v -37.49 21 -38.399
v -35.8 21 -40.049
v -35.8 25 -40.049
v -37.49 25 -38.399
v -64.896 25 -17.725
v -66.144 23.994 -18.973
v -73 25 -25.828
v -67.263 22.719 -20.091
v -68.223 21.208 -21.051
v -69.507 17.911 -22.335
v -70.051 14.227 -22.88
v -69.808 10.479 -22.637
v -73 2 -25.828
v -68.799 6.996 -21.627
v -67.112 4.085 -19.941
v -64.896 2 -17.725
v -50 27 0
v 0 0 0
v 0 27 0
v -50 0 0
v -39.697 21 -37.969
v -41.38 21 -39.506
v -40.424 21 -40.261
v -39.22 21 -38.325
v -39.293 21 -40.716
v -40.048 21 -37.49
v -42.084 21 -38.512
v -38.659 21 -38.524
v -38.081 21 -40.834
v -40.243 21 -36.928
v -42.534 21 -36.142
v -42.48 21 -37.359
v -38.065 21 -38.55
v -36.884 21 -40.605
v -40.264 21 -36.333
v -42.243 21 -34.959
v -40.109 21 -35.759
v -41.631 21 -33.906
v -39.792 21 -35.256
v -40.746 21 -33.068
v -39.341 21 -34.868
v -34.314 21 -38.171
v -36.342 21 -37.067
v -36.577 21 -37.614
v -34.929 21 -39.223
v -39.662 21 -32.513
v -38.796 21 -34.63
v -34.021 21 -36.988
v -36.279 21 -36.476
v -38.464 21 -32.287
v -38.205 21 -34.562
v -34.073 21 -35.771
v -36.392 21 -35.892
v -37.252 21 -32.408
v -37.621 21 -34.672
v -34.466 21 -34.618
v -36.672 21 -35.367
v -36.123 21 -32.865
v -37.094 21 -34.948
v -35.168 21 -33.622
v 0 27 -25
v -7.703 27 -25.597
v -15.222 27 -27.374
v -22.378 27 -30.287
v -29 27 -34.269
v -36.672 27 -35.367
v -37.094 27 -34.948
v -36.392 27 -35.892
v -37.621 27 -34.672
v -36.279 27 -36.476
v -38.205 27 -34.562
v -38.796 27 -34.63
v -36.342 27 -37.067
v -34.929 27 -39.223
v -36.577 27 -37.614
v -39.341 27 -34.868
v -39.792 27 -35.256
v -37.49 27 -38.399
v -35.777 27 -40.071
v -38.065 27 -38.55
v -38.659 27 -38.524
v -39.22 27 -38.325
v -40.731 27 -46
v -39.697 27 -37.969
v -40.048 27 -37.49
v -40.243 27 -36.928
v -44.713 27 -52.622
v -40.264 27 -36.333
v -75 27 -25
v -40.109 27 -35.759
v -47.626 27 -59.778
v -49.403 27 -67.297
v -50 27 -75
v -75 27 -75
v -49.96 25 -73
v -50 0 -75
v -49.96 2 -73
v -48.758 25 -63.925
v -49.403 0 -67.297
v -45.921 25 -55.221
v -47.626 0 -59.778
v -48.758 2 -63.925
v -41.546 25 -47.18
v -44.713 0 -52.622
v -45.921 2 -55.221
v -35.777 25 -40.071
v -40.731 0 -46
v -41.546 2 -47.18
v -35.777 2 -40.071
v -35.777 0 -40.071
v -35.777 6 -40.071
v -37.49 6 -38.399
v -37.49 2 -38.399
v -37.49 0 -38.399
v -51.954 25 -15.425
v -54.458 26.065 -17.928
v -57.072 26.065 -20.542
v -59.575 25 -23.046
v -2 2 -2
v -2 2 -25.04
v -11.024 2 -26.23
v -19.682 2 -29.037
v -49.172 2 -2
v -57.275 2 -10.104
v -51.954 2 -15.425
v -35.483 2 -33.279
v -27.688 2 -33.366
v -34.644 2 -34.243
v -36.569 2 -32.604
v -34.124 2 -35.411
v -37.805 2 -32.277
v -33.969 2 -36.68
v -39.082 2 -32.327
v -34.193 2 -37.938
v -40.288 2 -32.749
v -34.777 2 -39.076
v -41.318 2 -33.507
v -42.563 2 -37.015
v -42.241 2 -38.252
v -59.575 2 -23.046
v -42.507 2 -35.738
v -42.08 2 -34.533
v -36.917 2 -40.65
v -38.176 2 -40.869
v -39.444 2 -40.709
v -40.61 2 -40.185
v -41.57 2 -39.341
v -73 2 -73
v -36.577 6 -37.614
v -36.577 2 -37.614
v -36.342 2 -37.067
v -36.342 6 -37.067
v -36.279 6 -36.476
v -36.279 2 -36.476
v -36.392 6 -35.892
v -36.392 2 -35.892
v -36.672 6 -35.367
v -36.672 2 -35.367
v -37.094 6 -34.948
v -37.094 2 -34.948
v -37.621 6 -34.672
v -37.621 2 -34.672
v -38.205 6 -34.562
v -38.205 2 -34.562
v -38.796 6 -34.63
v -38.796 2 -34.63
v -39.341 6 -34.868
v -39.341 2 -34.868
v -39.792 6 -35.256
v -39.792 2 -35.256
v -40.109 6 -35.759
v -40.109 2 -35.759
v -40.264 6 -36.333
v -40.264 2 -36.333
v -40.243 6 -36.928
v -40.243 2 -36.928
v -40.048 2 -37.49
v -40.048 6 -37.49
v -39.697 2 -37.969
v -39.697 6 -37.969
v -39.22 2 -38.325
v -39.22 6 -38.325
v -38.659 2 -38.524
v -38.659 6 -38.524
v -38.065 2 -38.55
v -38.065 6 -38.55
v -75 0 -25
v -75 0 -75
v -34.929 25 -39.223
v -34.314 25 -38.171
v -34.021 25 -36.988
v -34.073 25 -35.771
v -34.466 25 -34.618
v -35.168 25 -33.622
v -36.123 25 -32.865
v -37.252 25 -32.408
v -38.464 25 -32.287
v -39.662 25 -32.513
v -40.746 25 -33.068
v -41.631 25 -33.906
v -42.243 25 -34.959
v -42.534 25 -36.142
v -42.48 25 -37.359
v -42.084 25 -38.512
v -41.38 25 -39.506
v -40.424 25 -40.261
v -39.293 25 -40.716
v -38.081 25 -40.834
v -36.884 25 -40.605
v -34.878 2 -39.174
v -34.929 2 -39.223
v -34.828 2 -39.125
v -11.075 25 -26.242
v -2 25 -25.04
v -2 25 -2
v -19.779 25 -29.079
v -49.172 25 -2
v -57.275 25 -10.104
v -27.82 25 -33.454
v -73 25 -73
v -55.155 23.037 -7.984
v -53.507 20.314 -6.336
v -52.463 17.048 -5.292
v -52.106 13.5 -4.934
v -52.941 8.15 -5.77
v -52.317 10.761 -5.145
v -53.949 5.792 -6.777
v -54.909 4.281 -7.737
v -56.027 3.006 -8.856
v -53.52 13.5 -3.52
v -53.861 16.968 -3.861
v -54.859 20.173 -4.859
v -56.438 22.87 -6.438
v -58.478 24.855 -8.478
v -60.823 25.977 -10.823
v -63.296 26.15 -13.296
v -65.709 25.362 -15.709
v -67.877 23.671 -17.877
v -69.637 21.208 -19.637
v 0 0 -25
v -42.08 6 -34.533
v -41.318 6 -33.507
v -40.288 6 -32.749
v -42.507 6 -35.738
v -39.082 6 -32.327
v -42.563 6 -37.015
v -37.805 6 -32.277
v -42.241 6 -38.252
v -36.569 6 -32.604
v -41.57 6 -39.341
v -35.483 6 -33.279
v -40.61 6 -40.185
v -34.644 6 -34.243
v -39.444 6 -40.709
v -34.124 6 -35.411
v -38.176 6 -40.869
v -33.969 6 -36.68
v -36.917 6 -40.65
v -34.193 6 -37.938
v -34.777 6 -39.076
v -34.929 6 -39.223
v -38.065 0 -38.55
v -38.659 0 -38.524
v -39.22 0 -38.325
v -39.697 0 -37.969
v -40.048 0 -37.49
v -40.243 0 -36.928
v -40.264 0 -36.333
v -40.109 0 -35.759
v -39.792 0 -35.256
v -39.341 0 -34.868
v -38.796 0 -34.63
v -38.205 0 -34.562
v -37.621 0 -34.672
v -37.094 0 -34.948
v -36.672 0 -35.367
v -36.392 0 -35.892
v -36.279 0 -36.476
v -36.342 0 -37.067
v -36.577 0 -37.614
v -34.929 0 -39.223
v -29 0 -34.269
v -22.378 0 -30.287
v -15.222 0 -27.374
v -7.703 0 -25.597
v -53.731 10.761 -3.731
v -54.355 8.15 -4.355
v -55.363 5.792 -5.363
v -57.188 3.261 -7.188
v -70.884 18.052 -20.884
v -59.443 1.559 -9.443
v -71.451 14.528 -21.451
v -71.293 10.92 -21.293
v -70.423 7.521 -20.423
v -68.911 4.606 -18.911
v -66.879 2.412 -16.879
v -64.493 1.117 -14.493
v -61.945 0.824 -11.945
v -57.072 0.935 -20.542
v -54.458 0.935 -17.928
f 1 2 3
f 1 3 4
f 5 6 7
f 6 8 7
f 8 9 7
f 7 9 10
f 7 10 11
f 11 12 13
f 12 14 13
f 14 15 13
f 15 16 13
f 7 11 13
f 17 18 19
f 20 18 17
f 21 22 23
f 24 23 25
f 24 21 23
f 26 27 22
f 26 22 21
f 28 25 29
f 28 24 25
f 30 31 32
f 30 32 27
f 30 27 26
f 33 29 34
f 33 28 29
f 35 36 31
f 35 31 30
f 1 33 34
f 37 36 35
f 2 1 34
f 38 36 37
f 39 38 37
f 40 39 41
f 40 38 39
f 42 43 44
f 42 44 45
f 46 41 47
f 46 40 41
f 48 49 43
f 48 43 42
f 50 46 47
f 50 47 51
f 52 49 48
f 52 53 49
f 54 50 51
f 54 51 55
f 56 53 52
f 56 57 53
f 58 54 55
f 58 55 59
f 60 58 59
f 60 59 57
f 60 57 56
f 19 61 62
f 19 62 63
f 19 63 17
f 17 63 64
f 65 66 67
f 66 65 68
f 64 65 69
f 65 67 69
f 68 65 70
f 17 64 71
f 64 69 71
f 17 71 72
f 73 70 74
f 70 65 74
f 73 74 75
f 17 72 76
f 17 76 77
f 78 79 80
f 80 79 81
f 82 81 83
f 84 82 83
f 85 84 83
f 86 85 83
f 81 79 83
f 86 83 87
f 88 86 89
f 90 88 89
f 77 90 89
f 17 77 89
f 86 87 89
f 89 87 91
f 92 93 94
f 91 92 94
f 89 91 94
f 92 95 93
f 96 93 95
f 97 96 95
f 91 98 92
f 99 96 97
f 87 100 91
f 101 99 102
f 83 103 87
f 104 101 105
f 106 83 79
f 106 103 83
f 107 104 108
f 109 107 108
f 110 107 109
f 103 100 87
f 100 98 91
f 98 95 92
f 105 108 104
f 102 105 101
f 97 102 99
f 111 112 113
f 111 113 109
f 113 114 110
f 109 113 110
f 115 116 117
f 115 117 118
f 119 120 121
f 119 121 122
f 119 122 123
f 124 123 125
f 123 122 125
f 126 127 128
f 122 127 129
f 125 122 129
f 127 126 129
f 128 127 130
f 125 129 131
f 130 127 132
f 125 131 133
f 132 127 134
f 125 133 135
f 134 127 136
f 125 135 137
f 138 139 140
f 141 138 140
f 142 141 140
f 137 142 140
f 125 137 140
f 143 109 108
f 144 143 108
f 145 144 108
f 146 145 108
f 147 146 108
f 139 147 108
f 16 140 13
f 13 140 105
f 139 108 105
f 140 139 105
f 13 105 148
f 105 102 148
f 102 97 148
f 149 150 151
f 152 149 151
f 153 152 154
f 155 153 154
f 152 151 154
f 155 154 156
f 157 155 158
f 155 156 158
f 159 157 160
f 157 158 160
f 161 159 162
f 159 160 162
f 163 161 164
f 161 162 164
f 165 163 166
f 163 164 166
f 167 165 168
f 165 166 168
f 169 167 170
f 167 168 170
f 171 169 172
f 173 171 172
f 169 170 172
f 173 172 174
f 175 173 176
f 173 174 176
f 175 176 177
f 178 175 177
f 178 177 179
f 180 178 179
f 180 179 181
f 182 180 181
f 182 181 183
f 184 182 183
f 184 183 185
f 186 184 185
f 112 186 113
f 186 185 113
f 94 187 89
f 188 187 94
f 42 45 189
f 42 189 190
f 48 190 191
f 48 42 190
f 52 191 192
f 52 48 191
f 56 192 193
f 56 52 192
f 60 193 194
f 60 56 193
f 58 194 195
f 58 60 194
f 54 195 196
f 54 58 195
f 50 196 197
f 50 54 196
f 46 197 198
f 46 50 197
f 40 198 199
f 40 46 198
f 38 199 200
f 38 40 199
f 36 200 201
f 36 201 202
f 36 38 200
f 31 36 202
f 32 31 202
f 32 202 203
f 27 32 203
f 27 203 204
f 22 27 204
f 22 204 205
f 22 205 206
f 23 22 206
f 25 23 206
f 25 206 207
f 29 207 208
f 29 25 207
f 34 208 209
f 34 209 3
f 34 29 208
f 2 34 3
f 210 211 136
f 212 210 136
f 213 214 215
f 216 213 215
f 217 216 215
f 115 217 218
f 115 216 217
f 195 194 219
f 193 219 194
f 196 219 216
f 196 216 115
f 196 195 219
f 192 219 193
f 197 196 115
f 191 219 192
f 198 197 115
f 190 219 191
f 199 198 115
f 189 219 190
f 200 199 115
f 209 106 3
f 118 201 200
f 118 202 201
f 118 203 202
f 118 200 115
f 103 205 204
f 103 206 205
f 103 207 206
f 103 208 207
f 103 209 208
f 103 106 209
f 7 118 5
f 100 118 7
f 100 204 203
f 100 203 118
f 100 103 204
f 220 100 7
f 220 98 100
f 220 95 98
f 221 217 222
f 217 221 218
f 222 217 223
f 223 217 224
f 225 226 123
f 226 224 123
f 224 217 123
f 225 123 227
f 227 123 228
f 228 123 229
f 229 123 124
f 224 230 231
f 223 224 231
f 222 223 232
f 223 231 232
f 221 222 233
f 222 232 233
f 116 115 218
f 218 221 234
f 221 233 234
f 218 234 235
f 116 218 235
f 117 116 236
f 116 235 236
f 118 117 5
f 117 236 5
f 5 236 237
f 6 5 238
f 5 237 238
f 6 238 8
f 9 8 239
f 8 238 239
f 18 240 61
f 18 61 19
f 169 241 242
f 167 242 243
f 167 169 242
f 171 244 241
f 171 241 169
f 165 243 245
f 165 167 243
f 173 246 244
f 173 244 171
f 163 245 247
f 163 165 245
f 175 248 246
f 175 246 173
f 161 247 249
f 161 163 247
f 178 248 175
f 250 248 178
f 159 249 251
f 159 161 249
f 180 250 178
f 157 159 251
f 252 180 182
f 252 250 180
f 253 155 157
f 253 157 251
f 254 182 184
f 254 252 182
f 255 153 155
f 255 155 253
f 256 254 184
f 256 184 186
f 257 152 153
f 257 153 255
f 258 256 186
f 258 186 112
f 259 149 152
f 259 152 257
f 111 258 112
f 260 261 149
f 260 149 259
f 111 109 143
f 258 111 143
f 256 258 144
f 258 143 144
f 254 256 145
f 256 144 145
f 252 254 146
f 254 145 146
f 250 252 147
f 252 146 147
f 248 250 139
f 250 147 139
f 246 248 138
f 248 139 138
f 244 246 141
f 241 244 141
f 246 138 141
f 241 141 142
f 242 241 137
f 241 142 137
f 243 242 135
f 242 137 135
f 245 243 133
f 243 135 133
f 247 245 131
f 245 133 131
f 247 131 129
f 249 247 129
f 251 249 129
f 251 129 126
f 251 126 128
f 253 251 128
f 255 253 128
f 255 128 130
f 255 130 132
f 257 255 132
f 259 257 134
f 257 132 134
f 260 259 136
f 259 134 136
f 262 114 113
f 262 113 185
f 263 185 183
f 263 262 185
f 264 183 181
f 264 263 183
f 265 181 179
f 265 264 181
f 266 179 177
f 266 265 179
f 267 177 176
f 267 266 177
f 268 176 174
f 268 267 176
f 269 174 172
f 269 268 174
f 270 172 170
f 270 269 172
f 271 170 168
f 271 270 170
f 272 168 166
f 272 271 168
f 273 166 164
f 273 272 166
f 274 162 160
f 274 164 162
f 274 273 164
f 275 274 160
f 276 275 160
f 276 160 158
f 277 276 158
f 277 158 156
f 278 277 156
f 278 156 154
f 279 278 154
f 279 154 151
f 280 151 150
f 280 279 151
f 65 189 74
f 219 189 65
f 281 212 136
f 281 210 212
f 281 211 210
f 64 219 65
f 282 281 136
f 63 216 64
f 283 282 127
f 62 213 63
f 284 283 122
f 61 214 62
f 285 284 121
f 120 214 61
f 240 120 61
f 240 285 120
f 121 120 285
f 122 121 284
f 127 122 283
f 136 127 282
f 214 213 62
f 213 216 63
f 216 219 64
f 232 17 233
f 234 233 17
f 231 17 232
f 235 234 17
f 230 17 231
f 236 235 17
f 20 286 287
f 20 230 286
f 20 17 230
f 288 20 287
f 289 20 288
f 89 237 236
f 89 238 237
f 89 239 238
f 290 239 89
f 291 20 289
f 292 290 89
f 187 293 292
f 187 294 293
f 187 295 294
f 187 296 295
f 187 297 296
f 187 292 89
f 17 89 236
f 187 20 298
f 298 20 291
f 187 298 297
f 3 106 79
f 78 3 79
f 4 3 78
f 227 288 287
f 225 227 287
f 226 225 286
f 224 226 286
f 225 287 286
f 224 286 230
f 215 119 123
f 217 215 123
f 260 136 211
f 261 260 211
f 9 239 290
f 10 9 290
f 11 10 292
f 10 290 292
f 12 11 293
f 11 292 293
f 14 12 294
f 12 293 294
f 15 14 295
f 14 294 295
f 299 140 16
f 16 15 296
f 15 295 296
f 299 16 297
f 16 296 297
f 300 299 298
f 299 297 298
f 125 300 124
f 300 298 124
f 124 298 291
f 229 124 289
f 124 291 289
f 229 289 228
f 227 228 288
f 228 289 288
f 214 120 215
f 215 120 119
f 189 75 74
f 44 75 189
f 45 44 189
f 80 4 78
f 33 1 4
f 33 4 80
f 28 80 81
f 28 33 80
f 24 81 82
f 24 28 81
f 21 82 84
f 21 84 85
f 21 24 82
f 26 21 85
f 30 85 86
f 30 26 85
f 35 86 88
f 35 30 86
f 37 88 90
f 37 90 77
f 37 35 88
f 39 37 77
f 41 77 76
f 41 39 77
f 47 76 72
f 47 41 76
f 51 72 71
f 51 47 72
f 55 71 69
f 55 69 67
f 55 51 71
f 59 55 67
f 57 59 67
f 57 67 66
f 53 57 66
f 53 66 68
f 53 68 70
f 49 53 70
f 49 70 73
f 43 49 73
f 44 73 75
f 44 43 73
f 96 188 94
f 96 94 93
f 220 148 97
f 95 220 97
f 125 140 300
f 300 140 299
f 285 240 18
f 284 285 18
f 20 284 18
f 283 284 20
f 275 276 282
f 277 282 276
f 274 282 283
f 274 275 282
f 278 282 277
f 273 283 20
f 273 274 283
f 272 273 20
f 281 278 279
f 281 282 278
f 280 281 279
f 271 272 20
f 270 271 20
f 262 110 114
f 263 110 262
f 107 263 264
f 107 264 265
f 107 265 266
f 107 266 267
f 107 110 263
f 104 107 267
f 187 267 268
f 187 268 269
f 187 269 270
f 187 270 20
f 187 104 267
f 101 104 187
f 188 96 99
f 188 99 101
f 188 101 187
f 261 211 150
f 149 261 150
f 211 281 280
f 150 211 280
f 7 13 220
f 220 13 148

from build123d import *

# Parameters (mm, degrees)
BOSS_EXTRUDE1_DEPTH = 27
SHELL1_T            = -2
CUT_EXTRUDE1_DEPTH  = 9.525
BOSS_EXTRUDE2_DEPTH = 4
BOSS_EXTRUDE3_START = 4
BOSS_EXTRUDE3_DEPTH = 4


with BuildPart() as part:
    # Sketch3 → Boss-Extrude1 (new body)
    with BuildSketch(Plane(origin=(0, 0, 0), x_dir=(1, 0, 0), z_dir=(0, 1, 0))):
        with BuildLine():
            Line((0, 0), (-50, 0))
            Line((-50, 0), (-74.999999958, 24.999999958))
            Line((-74.999999958, 24.999999958), (-74.999999958, 74.999999958))
            Line((-74.999999958, 74.999999958), (-49.999999958, 74.999999958))
            ThreePointArc((-49.999999958, 74.999999958), (-46.307946536, 56.143327838), (-35.777036608, 40.071449353))
            Line((-35.777036608, 40.071449353), (-37.489680236, 38.399422676))
            ThreePointArc((-37.489680236, 38.399422676), (-39.581385752, 35.04480348), (-36.576633855, 37.613882683))
            Line((-36.576633855, 37.613882683), (-34.928507994, 39.222921692))
            ThreePointArc((-34.928507994, 39.222921692), (-18.856644541, 28.692042147), (0, 24.999999958))
            Line((0, 24.999999958), (0, 0))
        make_face()
    extrude(amount=BOSS_EXTRUDE1_DEPTH)

    # Shell1
    shell1_openings = [part.faces().sort_by_distance(p)[0] for p in [
        (-46.307946536, 13.5, -56.143327838),
        (-36.633358422, 13.5, -39.235436014),
        (-39.581385752, 13.5, -35.04480348),
        (-35.752570925, 13.5, -38.418402187),
        (-18.856644541, 13.5, -28.692042147),
    ]]
    offset(amount=SHELL1_T, openings=shell1_openings, kind=Kind.INTERSECTION)

    # Sketch5 → Cut-Extrude1 (cut)
    with BuildSketch(Plane(origin=(-25, 0, 25), x_dir=(0.7071067811865527, 0, 0.7071067811865425), z_dir=(-0.7071067811865425, 0, 0.7071067811865527))):
        with BuildLine():
            ThreePointArc((-63.126370107, 21.20805116), (-60.741059719, 3.406638453), (-42.939647012, 5.79194884))
            Line((-42.939647012, 5.79194884), (-63.126370107, 21.20805116))
        make_face()
        with BuildLine():
            Line((-63.126370107, 21.20805116), (-42.939647012, 5.79194884))
            ThreePointArc((-42.939647012, 5.79194884), (-41.002304265, 9.431566127), (-40.333008559, 13.5))
            ThreePointArc((-40.333008559, 13.5), (-48.964574687, 25.530704295), (-63.126370107, 21.20805116))
        make_face()
    extrude(amount=-CUT_EXTRUDE1_DEPTH, mode=Mode.SUBTRACT)

    # Sketch6 → Boss-Extrude2 (add)
    with BuildSketch(Plane(origin=(0, 2, 0), x_dir=(1, 0, 0), z_dir=(0, 1, 0))):
        with BuildLine():
            Line((-34.777058513, 39.075687839), (-34.928507994, 39.222921692))
            Line((-34.928507994, 39.222921692), (-36.576633855, 37.613882683))
            ThreePointArc((-36.576633855, 37.613882683), (-39.581385752, 35.04480348), (-37.489680236, 38.399422676))
            Line((-37.489680236, 38.399422676), (-35.777036608, 40.071449353))
            ThreePointArc((-35.777036608, 40.071449353), (-41.317990025, 33.507045583), (-34.777058513, 39.075687839))
        make_face()
    extrude(amount=BOSS_EXTRUDE2_DEPTH)

    # Sketch7 → Boss-Extrude3 (add)
    with BuildSketch(Plane.XZ.offset(-25).offset(BOSS_EXTRUDE3_START)):
        with BuildLine():
            ThreePointArc((-37.489680236, -38.399422676), (-39.581385752, -35.04480348), (-36.576633855, -37.613882683))
            Line((-36.576633855, -37.613882683), (-34.928507994, -39.222921692))
            ThreePointArc((-34.928507994, -39.222921692), (-41.218708816, -33.455259804), (-35.800323385, -40.048714843))
            Line((-35.800323385, -40.048714843), (-37.489680236, -38.399422676))
        make_face()
    extrude(amount=-BOSS_EXTRUDE3_DEPTH)


solid = part.part
